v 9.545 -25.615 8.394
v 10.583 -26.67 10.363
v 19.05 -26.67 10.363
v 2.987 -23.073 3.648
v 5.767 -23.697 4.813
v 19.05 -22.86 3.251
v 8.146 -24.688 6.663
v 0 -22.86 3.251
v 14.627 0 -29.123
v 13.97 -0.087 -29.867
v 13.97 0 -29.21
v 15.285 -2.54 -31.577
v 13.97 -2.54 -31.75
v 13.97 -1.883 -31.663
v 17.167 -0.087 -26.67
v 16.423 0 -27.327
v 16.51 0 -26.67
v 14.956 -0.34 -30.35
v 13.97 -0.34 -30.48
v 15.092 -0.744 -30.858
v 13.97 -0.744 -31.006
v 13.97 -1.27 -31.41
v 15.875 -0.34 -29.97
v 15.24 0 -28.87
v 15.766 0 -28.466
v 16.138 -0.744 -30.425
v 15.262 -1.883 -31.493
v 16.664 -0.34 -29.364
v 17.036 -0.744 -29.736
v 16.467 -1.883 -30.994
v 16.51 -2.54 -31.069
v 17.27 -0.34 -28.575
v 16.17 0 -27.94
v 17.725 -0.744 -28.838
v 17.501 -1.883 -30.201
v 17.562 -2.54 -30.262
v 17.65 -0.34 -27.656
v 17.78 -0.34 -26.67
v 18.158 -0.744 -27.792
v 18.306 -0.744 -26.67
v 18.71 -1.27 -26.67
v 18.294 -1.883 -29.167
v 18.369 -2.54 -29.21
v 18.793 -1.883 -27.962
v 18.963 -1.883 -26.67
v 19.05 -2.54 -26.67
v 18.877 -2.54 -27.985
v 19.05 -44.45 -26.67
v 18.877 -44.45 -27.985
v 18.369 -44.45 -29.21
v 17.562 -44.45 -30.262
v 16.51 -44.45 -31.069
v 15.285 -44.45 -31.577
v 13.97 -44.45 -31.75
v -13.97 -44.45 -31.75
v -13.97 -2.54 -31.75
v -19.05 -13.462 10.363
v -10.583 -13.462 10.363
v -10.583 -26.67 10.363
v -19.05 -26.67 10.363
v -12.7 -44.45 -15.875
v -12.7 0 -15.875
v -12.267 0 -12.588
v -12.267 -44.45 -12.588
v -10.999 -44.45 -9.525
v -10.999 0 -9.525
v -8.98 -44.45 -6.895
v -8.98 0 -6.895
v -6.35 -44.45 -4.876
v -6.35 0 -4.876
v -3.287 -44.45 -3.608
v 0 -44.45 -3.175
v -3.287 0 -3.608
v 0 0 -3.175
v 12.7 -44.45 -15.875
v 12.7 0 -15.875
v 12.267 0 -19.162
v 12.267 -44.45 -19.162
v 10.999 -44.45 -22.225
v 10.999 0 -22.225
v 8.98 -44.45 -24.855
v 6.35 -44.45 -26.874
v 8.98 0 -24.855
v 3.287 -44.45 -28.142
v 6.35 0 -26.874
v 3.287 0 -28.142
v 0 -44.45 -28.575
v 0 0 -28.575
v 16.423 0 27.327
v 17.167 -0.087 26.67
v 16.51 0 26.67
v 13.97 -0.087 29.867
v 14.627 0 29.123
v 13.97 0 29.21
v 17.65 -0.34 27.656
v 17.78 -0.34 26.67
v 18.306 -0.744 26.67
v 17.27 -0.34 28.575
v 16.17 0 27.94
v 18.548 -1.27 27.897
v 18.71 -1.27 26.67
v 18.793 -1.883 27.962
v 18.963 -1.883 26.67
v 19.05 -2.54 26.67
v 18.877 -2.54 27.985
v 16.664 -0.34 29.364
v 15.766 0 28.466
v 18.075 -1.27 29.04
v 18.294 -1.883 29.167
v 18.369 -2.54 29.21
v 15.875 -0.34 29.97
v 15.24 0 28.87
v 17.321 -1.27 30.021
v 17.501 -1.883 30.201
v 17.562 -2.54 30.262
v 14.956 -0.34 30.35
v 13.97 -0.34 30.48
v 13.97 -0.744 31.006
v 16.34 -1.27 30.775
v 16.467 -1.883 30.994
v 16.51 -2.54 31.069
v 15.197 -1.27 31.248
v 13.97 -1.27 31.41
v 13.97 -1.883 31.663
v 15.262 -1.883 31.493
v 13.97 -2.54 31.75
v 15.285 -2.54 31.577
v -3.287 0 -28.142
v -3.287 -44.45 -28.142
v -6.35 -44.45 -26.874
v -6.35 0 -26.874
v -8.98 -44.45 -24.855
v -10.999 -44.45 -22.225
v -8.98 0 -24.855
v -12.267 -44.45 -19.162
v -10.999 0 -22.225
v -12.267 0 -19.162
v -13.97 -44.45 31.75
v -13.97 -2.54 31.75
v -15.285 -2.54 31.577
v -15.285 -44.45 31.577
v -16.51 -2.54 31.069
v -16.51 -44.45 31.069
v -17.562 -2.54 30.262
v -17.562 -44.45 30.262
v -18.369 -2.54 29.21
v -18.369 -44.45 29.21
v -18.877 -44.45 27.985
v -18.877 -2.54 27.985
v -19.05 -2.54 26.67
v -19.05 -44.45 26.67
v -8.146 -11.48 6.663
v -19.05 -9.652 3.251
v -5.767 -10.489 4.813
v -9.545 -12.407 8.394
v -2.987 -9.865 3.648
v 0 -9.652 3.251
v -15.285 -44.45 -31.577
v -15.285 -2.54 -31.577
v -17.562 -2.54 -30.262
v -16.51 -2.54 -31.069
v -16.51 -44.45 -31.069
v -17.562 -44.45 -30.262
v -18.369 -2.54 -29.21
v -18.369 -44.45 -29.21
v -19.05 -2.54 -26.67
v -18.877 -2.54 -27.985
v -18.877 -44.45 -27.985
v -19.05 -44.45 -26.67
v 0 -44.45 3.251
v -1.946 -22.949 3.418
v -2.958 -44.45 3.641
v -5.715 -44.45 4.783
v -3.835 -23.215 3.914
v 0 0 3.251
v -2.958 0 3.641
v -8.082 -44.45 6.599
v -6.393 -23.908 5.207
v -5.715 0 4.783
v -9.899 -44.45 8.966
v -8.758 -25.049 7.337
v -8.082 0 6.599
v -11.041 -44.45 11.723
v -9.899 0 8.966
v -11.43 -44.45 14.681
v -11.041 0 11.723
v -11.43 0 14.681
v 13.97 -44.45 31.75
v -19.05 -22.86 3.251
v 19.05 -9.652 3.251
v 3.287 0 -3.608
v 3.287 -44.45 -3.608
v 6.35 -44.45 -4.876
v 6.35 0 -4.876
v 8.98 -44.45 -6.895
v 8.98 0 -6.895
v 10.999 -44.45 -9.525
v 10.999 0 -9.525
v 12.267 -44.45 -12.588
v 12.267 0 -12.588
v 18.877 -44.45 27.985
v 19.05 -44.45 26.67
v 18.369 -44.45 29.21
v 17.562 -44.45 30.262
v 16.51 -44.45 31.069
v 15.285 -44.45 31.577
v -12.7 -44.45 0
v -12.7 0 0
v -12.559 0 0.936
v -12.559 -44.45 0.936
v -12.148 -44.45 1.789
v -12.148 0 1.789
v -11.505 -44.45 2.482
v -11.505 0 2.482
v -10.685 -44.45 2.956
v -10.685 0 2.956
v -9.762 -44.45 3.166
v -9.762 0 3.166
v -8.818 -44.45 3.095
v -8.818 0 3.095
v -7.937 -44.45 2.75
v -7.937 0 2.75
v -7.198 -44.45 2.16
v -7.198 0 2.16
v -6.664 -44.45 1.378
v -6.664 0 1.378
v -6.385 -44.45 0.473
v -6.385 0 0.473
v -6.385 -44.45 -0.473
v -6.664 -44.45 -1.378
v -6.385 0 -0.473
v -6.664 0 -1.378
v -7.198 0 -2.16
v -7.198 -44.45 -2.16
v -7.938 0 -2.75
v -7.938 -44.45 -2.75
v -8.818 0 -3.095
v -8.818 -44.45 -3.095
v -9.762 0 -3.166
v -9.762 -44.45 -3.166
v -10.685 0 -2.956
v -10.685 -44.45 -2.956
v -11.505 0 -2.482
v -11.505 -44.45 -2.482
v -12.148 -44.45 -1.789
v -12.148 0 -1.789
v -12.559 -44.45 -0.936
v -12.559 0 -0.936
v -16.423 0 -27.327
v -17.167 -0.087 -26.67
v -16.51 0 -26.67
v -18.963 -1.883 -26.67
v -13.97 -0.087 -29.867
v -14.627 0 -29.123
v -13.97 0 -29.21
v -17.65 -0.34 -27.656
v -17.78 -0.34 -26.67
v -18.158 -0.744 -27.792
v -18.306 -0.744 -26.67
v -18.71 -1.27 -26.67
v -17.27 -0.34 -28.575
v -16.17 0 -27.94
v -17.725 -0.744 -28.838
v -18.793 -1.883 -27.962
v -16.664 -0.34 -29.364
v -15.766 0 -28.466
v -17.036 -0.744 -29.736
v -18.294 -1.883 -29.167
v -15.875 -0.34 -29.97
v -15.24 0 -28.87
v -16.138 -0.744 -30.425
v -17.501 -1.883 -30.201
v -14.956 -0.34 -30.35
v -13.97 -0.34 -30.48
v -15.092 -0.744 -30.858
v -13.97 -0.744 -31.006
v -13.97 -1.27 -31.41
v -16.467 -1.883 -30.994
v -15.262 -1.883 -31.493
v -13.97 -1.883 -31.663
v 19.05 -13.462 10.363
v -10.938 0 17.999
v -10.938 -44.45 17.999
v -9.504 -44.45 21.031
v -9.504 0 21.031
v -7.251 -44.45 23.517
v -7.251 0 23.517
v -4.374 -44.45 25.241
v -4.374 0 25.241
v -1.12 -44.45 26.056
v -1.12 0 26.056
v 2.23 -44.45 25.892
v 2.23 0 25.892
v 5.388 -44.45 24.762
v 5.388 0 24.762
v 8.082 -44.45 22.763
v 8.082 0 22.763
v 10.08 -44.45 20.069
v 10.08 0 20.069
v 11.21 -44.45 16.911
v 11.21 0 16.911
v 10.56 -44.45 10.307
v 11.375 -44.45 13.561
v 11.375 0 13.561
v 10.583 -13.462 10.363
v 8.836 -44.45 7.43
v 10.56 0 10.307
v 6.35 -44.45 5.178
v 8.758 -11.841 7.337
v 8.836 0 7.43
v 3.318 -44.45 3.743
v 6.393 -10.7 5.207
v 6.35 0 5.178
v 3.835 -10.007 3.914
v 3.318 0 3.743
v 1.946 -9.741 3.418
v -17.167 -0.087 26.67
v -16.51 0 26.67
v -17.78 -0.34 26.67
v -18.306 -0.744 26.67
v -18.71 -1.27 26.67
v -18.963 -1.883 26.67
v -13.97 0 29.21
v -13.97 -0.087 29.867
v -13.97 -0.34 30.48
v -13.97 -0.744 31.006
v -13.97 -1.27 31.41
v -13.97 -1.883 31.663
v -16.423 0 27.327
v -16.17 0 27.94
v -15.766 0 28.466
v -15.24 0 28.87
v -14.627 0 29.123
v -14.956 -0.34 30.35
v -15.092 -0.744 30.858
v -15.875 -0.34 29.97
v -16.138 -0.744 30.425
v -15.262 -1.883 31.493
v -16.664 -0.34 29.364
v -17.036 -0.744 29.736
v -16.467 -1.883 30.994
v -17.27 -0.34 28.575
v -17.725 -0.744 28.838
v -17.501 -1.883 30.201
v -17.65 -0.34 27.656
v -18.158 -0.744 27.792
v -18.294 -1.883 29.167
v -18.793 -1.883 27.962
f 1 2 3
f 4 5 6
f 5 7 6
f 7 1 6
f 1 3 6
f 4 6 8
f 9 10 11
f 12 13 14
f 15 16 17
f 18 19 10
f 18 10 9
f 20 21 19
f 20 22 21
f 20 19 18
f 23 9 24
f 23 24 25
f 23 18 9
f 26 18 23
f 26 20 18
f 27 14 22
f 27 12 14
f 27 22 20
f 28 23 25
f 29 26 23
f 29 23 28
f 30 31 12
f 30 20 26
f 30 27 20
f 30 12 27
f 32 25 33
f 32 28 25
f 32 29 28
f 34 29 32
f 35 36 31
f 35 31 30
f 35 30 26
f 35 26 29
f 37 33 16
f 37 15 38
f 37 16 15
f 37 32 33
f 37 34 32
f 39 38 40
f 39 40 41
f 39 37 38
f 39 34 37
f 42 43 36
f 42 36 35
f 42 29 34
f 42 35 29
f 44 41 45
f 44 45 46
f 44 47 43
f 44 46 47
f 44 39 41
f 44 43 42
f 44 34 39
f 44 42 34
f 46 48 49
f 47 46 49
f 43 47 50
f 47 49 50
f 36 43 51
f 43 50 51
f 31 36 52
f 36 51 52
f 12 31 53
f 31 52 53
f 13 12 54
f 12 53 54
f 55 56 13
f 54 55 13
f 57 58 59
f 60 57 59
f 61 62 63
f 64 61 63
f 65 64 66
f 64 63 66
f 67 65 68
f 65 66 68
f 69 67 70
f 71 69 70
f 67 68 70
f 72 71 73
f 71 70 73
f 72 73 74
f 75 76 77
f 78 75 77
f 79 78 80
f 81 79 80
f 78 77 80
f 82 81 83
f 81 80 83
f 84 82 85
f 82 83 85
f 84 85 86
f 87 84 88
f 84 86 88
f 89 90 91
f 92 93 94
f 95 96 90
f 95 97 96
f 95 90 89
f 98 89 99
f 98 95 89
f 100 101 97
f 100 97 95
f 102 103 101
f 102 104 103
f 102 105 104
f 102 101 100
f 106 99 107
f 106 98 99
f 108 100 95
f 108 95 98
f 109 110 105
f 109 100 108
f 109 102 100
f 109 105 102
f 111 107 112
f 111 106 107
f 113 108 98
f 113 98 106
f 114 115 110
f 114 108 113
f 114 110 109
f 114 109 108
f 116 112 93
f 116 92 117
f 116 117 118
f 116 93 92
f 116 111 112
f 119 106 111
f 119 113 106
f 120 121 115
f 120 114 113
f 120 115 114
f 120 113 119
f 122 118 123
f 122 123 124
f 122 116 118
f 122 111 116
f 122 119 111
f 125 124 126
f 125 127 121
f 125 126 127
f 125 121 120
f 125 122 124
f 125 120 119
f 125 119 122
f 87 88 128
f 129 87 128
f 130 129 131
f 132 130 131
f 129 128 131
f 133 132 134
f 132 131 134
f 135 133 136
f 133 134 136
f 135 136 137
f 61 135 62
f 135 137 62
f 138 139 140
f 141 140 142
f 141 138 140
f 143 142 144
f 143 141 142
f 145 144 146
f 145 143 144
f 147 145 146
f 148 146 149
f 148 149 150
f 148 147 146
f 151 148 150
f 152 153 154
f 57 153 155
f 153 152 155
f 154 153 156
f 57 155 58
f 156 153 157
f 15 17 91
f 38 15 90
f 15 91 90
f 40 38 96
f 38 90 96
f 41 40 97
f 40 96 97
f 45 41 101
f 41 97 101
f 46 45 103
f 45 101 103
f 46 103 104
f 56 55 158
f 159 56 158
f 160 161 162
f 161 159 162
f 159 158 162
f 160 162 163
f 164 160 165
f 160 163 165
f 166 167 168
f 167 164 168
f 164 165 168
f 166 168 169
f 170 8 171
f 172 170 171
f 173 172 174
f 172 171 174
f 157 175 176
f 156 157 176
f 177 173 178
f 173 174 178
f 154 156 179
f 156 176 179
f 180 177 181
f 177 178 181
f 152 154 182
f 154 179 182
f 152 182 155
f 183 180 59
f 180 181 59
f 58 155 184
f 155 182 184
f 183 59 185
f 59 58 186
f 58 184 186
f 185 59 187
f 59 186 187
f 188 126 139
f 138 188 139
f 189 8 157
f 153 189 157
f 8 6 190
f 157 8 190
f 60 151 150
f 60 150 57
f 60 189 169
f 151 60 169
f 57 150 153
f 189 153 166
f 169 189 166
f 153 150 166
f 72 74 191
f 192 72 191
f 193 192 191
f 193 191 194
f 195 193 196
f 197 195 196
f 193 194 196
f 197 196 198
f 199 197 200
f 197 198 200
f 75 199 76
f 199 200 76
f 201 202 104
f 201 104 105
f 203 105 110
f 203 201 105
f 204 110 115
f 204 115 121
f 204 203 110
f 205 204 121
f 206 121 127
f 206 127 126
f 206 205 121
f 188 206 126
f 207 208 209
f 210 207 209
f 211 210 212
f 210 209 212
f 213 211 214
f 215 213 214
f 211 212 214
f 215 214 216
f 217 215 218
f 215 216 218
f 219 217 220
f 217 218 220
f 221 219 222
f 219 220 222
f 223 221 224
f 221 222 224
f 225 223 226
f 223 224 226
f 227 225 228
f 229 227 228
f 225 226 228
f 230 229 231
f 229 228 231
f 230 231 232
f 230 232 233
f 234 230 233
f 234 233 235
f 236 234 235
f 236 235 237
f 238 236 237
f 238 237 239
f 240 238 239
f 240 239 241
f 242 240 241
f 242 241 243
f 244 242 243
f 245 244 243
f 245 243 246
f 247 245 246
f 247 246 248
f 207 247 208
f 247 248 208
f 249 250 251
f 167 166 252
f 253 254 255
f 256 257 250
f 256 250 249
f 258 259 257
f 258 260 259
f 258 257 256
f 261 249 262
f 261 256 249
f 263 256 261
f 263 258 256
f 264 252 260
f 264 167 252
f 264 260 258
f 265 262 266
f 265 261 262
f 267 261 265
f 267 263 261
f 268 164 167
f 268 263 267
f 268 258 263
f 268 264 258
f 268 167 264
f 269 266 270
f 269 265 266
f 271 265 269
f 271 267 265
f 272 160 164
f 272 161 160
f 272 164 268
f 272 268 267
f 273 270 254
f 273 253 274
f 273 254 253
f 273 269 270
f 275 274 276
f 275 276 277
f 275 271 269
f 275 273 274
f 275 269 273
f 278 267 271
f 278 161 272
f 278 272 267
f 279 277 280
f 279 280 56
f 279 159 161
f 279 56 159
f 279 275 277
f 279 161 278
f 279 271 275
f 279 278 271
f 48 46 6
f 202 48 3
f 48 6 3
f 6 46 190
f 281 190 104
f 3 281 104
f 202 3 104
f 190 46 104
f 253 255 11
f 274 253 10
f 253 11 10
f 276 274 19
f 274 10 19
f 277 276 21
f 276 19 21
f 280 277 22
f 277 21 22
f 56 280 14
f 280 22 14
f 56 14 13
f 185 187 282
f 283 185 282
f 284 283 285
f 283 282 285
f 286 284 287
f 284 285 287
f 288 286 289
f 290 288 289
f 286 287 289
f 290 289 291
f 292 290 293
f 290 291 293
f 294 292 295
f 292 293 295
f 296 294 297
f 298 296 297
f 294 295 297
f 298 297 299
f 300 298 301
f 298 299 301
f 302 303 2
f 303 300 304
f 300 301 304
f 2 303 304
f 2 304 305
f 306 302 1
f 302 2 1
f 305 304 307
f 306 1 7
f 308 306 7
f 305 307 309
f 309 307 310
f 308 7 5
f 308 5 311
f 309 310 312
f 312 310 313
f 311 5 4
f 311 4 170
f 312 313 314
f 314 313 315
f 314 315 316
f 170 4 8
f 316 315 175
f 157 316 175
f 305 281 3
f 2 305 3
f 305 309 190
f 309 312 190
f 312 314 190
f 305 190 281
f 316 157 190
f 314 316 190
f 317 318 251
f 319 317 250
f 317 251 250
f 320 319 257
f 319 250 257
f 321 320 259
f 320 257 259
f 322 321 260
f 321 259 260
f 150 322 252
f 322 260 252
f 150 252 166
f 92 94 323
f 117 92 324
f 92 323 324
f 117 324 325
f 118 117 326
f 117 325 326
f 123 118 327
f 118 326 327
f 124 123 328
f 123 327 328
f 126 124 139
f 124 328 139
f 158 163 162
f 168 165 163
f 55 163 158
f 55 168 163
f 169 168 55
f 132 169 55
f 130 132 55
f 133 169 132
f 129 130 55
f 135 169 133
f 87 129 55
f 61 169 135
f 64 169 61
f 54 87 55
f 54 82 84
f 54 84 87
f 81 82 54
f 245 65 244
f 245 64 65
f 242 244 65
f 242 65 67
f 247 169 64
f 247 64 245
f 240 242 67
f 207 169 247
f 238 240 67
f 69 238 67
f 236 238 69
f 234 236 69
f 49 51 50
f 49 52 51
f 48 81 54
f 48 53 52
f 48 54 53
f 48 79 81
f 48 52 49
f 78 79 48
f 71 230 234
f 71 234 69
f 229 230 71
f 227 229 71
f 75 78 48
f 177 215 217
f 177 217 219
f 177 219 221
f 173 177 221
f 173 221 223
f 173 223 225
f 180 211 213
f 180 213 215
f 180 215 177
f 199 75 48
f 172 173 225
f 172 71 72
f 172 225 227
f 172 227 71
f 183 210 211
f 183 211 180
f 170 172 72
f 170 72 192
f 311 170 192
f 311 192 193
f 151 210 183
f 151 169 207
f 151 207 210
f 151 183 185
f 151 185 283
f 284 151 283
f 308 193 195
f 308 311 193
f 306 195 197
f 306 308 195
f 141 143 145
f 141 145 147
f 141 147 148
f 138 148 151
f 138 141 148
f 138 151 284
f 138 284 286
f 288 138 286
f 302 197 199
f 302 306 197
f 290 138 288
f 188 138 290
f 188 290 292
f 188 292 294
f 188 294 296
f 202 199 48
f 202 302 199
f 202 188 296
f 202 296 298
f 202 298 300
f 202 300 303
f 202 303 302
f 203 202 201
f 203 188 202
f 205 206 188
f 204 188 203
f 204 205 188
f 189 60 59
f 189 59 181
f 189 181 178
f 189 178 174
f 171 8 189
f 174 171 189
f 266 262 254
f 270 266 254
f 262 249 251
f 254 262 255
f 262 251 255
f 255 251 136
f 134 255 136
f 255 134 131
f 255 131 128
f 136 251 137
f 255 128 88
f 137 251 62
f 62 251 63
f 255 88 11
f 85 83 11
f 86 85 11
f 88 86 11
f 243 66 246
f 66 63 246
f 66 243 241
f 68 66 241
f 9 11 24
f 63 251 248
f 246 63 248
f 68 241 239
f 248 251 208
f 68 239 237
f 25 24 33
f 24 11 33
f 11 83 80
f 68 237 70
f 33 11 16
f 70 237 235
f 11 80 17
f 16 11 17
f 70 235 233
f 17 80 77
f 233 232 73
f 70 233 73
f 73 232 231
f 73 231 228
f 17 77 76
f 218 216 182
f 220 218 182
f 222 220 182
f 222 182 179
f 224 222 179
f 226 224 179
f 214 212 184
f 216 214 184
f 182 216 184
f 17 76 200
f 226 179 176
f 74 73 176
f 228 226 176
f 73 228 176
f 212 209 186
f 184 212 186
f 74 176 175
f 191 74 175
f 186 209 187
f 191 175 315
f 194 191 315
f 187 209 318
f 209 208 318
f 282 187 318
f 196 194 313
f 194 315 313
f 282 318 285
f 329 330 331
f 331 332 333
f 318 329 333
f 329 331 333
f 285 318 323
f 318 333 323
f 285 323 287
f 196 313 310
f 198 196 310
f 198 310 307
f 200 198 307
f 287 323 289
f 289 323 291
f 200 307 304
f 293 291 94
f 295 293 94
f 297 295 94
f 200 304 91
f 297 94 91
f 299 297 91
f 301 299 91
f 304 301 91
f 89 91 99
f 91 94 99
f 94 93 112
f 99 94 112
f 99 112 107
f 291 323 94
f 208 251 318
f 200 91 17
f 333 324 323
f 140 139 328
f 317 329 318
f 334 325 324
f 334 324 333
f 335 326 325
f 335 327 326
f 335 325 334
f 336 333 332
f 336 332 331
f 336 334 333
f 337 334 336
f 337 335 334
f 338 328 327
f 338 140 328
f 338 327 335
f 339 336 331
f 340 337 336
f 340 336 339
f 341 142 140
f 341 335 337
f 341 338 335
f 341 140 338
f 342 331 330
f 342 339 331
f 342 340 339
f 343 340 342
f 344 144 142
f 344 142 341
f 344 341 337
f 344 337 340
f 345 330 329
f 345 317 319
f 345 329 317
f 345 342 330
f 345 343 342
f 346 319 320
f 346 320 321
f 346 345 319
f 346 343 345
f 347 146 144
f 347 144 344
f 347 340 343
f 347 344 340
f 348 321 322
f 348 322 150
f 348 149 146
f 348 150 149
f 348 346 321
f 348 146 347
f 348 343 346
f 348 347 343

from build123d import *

# Parameters (mm, degrees)
F1_DEPTH = 44.45
F3_DEPTH = 44.451
F5_DEPTH = 38.101
F6_R     = 5.08
F7_R     = 5.08
F8_R     = 2.54


with BuildPart() as f1:
    # F0 (on Front) → F1 (new body)
    with BuildSketch(Plane.XZ):
        Polygon((19.05, -31.75), (19.05, 31.75), (-19.05, 31.75), (-19.05, 0), (-19.05, -31.75), align=None)
        with BuildLine():
            ThreePointArc((-6.35, 0), (-9.525, -3.175), (-12.7, 0))
            ThreePointArc((-12.7, 0), (-9.525, 3.175), (-6.35, 0))
        make_face(mode=Mode.SUBTRACT)
    extrude(amount=F1_DEPTH)

    # F2 (on face) → F3 (cut, through all)
    with BuildSketch(Plane(origin=(0, 0, 0), x_dir=(-1, 0, 0), z_dir=(0, 1, 0))):
        with BuildLine():
            ThreePointArc((-12.7, -15.875), (-8.980256, -24.855256), (0, -28.575))
            Line((0, -28.575), (0, -15.875))
            Line((0, -15.875), (-12.7, -15.875))
        make_face()
        with BuildLine():
            Line((0, -15.875), (0, -28.575))
            ThreePointArc((0, -28.575), (8.980256, -24.855256), (12.7, -15.875))
            Line((12.7, -15.875), (0, -15.875))
        make_face()
        with BuildLine():
            ThreePointArc((11.43, 14.6812), (-8.082231, 22.763431), (0, 3.2512))
            ThreePointArc((0, 3.2512), (8.082231, 6.598969), (11.43, 14.6812))
        make_face()
        with BuildLine():
            Line((-12.7, -15.875), (0, -15.875))
            Line((0, -15.875), (0, -3.175))
            ThreePointArc((0, -3.175), (-8.980256, -6.894744), (-12.7, -15.875))
        make_face()
        with BuildLine():
            Line((0, -3.175), (0, -15.875))
            Line((0, -15.875), (12.7, -15.875))
            ThreePointArc((12.7, -15.875), (8.980256, -6.894744), (0, -3.175))
        make_face()
    extrude(amount=-F3_DEPTH, mode=Mode.SUBTRACT)

    # F4 (on face) → F5 (cut, through all)
    with BuildSketch(Plane.YZ.offset(19.05)):
        Polygon((-22.86, 3.2512), (-9.652, 3.2512), (-13.462, 10.3632), (-26.67, 10.3632), align=None)
    extrude(amount=-F5_DEPTH, mode=Mode.SUBTRACT)

    # F6
    f6_edges = [f1.edges().sort_by_distance(p)[0] for p in [
        (-19.05, -22.225, 31.75),
        (19.05, -22.225, 31.75),
    ]]
    fillet(f6_edges, radius=F6_R)

    # F7
    f7_edges = [f1.edges().sort_by_distance(p)[0] for p in [
        (19.05, -22.225, -31.75),
        (-19.05, -22.225, -31.75),
    ]]
    fillet(f7_edges, radius=F7_R)

    # F8
    f8_edges = [f1.edges().sort_by_distance(p)[0] for p in [
        (0, 0, 31.75),
    ]]
    fillet(f8_edges, radius=F8_R)


solid = f1.part
